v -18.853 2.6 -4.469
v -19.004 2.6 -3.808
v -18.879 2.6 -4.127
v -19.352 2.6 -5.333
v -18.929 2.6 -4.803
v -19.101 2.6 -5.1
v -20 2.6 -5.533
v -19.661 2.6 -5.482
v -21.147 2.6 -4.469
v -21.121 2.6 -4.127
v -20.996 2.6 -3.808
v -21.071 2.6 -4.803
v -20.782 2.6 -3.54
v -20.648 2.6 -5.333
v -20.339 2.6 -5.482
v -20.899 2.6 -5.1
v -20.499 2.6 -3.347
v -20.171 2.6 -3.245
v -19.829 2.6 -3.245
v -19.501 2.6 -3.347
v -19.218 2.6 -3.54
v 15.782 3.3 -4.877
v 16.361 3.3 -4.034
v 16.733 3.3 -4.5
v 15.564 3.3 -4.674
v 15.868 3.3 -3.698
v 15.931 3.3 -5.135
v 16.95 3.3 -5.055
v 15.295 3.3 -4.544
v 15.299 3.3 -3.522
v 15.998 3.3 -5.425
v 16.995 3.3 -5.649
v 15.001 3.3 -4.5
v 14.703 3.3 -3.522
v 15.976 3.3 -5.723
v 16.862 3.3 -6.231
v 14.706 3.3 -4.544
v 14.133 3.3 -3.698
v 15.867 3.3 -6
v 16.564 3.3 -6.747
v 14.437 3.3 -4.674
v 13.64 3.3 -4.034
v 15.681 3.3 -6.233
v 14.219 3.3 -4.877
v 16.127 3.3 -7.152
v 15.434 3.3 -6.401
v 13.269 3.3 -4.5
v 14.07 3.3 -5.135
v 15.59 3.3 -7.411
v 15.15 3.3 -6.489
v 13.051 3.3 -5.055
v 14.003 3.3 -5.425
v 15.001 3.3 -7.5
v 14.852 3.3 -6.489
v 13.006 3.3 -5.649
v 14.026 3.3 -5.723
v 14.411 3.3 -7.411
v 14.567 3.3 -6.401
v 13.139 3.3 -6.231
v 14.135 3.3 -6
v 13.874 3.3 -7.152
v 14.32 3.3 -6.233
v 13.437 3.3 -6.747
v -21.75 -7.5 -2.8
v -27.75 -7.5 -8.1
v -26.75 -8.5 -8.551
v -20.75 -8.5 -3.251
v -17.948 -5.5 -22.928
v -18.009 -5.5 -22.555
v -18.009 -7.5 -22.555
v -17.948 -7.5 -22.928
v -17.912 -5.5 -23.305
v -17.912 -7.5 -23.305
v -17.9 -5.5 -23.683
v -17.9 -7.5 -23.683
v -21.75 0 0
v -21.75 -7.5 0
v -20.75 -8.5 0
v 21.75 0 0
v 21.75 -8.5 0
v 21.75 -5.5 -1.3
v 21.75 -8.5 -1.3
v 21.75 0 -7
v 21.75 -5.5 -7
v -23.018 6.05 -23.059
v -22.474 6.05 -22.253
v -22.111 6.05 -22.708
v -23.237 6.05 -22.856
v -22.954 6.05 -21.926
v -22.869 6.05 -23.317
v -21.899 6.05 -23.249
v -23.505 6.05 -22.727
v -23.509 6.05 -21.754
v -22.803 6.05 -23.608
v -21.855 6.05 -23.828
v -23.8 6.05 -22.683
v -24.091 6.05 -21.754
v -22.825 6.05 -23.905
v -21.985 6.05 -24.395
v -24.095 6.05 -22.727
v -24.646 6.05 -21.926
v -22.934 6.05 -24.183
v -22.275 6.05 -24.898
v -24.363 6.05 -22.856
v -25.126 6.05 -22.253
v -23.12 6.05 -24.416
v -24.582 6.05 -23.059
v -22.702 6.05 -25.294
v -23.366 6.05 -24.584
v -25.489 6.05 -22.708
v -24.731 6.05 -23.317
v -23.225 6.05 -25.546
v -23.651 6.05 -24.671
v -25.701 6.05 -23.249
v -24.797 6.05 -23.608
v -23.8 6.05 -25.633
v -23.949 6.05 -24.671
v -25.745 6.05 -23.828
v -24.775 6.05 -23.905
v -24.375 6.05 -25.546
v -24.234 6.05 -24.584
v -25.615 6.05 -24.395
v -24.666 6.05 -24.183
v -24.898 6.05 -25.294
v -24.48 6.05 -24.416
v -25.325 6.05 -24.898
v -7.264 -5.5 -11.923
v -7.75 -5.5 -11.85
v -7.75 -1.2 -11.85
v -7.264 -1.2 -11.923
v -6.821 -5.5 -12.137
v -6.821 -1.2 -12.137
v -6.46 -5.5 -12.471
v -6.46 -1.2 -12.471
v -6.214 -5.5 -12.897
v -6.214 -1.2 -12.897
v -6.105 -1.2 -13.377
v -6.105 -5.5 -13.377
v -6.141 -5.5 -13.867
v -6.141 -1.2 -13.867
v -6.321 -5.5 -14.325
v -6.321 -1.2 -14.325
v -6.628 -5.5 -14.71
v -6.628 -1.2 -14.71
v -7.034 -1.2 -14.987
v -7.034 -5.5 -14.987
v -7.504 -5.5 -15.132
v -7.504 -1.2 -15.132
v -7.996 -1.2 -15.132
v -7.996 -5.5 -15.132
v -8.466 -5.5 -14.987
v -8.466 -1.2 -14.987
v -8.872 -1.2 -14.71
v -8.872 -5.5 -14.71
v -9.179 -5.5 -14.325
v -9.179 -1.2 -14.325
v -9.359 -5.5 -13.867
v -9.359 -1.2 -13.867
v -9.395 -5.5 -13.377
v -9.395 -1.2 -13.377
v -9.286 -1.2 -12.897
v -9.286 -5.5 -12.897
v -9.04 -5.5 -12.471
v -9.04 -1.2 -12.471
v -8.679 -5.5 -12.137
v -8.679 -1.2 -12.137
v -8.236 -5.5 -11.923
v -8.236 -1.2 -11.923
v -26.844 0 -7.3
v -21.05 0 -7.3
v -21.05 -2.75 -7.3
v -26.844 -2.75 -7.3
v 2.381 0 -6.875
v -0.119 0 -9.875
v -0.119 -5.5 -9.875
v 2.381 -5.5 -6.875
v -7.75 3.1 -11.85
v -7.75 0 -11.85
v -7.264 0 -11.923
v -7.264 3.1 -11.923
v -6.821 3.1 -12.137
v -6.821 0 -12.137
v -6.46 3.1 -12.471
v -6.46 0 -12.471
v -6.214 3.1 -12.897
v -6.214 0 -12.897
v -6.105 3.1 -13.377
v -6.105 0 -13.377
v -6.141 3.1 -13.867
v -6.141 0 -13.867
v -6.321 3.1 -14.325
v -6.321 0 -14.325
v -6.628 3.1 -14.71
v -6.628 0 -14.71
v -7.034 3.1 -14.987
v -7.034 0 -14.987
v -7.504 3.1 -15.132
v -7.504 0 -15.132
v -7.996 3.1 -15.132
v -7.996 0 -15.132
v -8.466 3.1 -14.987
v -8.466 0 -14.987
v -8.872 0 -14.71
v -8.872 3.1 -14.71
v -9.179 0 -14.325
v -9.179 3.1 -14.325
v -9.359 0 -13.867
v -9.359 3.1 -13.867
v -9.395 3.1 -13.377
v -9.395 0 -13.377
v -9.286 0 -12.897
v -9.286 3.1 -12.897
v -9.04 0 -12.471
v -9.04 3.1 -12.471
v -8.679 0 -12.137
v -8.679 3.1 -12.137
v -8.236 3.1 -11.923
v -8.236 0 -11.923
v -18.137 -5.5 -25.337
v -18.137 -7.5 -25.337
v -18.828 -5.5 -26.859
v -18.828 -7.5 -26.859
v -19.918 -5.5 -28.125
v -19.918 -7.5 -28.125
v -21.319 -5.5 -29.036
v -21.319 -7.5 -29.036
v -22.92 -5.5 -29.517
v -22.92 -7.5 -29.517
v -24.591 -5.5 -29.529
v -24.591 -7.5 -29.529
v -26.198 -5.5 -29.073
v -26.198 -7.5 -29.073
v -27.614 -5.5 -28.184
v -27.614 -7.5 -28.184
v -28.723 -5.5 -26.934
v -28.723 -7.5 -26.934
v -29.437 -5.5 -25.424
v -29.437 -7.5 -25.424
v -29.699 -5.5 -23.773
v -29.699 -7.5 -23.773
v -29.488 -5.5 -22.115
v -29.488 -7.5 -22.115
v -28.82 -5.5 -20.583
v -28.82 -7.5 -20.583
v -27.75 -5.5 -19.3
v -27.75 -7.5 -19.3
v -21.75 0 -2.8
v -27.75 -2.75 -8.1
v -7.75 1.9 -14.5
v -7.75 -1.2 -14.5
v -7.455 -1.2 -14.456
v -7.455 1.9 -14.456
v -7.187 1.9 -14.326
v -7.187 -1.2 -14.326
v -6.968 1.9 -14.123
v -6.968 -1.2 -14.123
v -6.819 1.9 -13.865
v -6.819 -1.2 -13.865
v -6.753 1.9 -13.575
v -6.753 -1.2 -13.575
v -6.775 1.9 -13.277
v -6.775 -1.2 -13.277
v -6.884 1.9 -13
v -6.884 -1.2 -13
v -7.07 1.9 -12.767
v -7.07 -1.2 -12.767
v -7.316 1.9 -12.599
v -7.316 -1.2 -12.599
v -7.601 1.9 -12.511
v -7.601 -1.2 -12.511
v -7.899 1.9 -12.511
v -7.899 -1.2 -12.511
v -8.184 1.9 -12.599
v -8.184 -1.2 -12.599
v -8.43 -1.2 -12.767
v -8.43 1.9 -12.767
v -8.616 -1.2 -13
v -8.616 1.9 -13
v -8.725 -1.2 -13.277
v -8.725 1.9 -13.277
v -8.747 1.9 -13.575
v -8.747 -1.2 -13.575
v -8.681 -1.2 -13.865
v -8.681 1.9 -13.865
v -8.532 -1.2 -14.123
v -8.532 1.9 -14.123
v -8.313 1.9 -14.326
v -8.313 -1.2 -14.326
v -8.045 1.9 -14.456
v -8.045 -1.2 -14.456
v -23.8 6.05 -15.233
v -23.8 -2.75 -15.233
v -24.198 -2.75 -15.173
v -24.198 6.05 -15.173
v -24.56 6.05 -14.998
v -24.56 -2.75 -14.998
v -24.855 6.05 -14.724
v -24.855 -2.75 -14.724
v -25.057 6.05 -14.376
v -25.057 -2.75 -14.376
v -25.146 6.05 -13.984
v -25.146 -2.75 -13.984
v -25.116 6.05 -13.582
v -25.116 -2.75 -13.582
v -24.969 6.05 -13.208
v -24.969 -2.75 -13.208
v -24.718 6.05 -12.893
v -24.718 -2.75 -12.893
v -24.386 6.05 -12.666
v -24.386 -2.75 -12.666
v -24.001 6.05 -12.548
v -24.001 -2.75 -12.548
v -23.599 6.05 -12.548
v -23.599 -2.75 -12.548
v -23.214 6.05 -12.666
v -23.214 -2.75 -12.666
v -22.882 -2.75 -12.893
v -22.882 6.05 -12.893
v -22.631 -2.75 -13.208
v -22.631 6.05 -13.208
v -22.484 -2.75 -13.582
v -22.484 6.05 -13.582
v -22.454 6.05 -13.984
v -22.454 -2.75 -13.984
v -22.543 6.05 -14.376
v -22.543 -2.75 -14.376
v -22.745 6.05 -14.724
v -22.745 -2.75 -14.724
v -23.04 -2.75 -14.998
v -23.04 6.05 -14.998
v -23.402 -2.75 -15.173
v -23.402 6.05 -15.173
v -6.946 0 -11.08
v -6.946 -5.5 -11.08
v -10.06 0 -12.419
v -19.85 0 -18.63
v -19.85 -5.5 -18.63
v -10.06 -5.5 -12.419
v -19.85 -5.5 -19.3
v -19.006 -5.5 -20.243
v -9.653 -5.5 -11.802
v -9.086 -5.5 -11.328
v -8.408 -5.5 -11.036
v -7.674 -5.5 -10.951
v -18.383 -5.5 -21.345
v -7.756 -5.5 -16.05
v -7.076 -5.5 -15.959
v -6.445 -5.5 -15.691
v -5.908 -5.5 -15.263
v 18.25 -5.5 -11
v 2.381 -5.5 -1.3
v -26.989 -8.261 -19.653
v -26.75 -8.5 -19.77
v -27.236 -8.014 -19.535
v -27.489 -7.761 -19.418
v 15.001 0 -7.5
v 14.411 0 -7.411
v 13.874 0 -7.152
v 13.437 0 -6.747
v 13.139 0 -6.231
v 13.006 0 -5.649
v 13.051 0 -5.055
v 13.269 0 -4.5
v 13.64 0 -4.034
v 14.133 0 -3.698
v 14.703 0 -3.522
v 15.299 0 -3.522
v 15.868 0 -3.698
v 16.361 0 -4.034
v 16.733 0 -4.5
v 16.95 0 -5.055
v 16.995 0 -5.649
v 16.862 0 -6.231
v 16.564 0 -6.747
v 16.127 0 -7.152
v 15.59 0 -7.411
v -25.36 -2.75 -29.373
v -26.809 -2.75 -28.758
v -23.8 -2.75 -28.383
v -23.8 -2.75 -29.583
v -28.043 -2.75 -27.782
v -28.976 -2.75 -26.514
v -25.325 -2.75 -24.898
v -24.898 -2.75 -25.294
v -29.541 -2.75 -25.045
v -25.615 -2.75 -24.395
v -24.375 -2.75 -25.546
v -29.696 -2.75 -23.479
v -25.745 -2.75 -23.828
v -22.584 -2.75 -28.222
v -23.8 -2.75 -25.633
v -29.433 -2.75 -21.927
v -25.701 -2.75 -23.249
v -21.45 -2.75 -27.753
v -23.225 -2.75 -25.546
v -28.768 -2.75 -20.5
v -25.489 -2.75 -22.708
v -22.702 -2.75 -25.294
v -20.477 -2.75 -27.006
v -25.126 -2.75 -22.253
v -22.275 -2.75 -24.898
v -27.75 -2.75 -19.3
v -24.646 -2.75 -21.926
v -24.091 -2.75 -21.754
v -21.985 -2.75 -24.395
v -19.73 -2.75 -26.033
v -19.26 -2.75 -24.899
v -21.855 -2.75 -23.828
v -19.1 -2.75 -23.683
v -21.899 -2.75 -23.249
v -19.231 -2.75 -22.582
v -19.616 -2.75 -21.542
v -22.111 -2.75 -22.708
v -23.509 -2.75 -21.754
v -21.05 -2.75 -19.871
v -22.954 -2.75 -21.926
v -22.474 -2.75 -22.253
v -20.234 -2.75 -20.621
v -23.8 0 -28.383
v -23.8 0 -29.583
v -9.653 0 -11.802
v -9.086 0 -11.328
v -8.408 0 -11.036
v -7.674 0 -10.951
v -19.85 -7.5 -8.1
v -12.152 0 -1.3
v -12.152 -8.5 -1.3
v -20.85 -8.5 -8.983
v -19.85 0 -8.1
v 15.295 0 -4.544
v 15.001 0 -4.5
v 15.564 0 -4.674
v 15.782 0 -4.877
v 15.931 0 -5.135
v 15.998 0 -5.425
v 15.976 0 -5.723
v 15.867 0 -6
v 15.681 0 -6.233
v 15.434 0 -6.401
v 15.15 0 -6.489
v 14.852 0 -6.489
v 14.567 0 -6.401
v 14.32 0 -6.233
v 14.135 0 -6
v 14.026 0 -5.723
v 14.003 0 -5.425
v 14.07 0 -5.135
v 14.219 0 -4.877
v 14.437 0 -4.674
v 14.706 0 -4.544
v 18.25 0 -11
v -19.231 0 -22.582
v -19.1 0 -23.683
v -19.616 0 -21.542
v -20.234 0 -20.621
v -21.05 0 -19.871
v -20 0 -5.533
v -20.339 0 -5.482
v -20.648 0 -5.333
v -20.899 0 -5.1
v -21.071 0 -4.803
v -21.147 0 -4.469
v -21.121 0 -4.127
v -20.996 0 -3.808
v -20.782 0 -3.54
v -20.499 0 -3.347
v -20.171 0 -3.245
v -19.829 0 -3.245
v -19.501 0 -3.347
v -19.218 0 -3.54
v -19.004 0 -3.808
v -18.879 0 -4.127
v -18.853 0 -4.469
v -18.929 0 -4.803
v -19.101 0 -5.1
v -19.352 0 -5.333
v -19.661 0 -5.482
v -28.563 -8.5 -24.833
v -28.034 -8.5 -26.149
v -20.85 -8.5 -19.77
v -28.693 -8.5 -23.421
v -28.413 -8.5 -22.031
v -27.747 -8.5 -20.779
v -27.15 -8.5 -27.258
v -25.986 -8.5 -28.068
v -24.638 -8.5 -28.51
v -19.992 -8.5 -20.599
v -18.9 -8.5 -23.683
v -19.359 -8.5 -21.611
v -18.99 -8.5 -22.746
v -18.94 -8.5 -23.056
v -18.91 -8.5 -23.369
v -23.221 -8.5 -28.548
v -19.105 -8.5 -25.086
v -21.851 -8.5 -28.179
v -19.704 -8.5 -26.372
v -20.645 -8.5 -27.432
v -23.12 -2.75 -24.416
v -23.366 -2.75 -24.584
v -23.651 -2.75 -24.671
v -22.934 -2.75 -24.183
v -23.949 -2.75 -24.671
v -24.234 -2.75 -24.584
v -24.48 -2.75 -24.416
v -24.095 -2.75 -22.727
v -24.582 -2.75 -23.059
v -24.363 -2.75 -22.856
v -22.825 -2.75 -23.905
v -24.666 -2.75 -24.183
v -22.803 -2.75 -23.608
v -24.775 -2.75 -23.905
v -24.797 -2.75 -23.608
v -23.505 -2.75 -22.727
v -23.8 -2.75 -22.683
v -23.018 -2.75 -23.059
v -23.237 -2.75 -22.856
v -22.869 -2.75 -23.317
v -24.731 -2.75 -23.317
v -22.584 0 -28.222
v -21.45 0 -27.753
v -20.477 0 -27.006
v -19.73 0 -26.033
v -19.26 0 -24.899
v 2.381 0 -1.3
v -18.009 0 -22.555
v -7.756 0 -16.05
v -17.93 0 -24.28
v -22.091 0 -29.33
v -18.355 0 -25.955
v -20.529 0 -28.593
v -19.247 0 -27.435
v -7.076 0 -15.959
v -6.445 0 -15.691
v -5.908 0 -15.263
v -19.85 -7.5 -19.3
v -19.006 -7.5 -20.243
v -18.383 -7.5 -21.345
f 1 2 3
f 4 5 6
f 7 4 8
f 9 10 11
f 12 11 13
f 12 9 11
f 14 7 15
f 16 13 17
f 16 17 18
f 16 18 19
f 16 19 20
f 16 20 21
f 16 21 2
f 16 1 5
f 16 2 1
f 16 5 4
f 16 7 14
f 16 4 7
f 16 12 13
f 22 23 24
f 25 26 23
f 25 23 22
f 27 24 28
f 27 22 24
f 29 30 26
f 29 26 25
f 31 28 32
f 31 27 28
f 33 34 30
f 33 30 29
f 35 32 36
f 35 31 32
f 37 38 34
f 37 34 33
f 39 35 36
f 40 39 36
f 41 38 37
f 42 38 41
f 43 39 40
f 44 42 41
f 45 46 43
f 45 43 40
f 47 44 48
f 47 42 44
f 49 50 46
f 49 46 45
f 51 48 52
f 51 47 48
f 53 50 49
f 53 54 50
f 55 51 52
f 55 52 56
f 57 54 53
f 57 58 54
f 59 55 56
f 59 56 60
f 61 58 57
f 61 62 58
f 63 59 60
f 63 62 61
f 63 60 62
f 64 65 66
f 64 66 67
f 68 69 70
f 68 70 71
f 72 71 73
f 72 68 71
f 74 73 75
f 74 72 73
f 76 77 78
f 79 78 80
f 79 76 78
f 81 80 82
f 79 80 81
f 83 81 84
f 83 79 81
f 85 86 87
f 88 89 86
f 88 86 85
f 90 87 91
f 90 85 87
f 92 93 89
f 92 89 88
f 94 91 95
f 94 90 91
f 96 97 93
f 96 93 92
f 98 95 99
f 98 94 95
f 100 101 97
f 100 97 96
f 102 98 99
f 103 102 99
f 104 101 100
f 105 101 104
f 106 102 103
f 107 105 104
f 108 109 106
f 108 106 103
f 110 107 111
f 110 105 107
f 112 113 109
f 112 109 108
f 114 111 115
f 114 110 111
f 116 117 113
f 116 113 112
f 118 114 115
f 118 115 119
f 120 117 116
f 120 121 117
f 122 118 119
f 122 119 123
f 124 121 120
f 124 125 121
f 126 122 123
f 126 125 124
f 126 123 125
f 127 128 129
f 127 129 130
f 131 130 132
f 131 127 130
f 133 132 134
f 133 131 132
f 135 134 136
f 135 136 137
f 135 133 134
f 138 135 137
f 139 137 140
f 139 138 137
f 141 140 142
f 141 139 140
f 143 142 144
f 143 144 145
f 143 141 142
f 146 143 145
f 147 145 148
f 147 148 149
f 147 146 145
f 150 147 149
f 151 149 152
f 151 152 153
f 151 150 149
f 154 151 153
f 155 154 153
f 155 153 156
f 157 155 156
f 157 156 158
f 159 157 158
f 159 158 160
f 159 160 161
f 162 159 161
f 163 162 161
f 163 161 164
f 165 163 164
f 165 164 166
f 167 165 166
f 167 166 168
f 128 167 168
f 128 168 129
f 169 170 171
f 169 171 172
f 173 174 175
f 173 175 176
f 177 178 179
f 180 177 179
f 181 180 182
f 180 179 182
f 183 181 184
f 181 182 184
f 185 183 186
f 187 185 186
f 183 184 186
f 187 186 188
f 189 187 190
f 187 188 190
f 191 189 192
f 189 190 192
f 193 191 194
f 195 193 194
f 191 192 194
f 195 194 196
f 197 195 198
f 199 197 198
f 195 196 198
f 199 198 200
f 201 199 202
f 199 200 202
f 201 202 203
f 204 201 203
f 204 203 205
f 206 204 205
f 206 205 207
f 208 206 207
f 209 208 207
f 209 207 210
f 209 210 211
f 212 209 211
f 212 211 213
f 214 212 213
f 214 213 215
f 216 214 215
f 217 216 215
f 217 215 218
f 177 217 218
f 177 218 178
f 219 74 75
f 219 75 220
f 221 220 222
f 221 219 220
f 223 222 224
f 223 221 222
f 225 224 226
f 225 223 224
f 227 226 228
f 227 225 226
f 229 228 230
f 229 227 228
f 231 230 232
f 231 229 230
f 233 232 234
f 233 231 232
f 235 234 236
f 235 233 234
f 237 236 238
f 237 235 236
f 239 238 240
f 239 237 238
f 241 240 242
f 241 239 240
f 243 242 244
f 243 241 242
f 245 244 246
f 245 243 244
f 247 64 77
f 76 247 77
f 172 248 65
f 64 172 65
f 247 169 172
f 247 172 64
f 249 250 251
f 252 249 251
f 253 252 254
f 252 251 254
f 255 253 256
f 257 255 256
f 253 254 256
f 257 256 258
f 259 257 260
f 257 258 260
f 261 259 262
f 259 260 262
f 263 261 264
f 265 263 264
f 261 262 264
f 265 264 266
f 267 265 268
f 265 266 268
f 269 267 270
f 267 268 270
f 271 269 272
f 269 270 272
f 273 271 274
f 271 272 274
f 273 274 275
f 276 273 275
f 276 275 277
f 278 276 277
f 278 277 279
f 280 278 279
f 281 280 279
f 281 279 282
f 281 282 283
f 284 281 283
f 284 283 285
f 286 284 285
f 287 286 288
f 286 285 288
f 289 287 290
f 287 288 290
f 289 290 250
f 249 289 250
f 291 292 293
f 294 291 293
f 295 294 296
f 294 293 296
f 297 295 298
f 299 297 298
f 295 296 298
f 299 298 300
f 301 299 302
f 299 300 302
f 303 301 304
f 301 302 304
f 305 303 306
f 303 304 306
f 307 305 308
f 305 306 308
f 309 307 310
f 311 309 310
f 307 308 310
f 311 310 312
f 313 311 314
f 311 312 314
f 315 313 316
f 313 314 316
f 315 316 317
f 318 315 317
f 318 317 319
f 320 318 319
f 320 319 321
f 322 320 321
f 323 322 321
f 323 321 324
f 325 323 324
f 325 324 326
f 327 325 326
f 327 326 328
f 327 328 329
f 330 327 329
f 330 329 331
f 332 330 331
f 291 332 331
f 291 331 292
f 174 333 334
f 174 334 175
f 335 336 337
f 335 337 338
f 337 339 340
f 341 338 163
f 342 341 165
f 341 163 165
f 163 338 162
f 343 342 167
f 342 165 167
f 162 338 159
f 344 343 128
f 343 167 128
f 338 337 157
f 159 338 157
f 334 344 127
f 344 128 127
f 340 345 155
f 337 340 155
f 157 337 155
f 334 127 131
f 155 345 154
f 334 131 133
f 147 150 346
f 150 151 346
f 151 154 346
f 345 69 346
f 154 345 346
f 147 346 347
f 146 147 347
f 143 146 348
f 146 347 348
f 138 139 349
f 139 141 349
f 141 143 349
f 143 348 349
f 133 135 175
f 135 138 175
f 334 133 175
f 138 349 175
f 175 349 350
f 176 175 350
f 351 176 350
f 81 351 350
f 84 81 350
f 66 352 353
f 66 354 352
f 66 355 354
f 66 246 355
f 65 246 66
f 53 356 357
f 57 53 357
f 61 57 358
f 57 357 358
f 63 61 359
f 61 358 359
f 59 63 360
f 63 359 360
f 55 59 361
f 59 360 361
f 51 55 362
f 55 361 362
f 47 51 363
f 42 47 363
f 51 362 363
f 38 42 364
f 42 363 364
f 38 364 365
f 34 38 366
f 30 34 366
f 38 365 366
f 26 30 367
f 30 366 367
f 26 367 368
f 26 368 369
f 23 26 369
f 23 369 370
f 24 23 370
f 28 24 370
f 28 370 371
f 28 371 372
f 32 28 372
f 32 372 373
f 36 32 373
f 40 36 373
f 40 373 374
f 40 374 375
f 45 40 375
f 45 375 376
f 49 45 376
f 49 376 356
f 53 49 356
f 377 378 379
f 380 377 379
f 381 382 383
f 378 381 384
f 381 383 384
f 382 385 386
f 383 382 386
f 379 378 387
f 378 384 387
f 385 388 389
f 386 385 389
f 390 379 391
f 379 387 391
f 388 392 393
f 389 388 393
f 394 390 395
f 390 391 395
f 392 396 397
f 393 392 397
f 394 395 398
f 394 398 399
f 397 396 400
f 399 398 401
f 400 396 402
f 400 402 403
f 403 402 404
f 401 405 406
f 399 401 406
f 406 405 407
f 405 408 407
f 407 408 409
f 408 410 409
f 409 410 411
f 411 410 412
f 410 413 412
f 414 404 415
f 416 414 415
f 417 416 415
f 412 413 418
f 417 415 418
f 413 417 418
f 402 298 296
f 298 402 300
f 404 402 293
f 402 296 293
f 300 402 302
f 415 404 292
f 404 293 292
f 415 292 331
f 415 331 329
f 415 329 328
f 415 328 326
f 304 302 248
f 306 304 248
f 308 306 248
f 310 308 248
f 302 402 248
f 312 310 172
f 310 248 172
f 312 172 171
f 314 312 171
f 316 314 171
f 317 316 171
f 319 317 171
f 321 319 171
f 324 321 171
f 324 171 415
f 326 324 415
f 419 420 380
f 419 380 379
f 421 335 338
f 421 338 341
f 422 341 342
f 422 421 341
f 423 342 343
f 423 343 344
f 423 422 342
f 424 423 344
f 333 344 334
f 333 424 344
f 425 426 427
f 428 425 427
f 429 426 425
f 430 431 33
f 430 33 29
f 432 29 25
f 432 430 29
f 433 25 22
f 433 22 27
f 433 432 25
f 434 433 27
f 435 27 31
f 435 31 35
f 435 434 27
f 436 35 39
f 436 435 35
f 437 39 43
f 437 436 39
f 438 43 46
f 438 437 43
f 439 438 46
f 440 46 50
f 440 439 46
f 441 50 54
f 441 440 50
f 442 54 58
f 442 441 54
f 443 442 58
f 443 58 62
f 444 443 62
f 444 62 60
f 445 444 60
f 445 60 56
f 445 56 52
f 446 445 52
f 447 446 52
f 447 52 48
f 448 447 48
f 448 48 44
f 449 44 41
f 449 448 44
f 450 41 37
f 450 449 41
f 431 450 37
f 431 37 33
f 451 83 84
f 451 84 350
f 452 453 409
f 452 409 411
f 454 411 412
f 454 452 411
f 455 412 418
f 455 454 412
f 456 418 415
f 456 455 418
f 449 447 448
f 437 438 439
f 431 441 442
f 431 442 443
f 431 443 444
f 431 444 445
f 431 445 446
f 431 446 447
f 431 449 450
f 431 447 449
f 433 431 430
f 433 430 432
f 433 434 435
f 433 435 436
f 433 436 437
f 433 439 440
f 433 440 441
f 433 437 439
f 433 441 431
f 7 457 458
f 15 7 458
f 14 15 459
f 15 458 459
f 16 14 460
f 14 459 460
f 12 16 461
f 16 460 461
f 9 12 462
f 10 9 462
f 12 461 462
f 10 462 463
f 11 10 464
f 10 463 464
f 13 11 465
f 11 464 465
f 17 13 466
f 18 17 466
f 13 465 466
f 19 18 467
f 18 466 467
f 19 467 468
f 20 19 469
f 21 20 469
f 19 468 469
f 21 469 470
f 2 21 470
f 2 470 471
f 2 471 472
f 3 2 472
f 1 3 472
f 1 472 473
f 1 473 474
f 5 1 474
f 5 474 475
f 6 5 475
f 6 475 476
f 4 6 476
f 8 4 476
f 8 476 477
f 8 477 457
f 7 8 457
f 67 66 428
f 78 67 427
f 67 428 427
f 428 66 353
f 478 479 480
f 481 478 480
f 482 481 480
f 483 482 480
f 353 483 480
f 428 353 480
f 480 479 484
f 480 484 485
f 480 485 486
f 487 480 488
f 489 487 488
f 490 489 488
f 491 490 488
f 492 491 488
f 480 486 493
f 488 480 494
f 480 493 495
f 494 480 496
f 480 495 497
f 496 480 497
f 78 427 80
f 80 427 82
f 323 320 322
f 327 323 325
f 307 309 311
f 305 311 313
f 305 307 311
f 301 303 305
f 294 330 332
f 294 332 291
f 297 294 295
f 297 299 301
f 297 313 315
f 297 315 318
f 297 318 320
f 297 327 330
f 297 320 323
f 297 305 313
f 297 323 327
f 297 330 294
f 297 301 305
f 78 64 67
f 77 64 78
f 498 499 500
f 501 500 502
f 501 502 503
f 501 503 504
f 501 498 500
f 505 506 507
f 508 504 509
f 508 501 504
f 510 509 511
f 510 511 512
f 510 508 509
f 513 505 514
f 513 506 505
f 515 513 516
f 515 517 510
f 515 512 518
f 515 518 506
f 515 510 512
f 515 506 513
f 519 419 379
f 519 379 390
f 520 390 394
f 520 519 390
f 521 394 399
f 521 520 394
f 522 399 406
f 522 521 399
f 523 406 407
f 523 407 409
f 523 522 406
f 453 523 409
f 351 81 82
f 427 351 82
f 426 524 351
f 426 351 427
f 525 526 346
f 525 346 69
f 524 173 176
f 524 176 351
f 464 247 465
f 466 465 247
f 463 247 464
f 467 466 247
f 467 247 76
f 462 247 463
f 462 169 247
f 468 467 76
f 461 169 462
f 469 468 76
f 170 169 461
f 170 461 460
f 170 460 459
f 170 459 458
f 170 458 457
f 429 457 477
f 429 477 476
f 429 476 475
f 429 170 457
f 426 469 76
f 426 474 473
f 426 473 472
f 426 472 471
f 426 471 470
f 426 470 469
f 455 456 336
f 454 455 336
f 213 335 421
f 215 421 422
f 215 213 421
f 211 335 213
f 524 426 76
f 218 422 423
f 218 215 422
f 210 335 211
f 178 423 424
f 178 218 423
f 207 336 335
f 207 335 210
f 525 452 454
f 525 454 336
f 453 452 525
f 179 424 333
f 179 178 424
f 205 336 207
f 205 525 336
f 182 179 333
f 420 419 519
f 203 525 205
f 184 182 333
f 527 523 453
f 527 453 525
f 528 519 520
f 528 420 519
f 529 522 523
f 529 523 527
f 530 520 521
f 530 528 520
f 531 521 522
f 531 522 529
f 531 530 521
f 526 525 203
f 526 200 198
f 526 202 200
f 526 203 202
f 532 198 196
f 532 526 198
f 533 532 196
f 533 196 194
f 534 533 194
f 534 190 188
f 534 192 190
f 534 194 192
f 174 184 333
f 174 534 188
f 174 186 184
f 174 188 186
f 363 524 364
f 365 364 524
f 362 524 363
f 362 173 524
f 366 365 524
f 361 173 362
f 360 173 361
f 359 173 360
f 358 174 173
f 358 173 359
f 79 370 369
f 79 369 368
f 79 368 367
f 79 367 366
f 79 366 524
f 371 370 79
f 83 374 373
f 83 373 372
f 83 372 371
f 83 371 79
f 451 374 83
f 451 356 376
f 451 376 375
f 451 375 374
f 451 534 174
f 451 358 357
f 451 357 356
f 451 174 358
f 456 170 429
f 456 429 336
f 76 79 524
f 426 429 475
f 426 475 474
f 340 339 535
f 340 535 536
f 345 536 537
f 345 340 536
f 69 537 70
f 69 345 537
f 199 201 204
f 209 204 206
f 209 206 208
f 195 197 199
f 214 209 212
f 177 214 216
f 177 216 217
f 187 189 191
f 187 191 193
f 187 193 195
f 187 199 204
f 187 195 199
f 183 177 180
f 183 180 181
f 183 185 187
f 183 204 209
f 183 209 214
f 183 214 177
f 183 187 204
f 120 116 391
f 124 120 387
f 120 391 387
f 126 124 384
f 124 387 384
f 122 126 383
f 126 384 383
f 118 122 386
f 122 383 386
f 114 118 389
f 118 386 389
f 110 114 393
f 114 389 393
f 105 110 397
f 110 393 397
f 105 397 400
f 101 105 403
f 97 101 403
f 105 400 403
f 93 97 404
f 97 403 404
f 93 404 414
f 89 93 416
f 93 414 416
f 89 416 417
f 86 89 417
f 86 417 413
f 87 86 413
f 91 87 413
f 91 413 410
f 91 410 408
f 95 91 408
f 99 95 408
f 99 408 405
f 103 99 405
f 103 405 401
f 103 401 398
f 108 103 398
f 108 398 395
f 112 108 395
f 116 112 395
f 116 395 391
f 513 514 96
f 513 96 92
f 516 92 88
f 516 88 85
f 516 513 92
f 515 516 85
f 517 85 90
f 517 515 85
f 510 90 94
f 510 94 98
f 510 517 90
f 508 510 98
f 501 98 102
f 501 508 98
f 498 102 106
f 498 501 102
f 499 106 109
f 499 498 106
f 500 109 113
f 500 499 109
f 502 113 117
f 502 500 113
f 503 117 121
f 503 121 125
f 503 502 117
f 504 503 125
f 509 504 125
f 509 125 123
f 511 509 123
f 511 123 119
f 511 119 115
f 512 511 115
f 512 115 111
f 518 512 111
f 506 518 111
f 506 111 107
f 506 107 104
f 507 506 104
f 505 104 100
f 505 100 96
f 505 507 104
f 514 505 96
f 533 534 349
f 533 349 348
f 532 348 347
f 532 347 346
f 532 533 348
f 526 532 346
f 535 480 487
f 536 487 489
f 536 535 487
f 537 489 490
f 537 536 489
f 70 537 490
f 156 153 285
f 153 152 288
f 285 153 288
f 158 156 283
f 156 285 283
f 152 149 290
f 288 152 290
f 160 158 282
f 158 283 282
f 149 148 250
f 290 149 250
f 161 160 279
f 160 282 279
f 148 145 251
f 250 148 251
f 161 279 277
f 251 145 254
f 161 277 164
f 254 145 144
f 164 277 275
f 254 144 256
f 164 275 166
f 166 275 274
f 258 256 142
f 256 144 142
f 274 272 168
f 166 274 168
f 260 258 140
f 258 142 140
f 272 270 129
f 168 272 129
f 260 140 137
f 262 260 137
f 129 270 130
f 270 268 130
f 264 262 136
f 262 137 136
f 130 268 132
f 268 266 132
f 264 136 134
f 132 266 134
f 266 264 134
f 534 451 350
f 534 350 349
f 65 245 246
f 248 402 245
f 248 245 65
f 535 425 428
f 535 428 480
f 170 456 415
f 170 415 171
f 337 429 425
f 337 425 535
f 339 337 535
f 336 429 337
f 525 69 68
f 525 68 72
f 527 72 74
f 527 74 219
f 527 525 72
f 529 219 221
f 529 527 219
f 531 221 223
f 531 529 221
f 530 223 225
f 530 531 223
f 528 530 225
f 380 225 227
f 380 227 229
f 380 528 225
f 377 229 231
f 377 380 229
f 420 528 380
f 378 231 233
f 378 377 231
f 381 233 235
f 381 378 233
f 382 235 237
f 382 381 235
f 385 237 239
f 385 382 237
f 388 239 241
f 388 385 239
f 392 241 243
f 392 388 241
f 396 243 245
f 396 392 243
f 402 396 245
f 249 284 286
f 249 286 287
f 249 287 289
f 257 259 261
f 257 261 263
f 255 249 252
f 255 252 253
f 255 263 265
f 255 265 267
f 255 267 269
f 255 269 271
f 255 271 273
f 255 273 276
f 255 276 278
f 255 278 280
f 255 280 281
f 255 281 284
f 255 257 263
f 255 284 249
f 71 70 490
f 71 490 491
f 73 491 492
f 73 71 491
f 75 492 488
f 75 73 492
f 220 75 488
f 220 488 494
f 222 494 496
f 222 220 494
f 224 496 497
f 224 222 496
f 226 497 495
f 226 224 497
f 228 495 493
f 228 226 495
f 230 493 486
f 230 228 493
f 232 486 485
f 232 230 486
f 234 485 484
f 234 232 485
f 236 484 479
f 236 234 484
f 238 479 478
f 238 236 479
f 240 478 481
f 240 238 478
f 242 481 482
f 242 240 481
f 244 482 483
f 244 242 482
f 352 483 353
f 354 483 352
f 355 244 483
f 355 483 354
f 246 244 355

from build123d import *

# Parameters (mm, degrees)
BOSS_EXTRUDE1_DEPTH      = 5.5
SKETCH2_R                = 1.65
CUT_EXTRUDE1_DEPTH       = 5.5
BOSS_EXTRUDE2_DEPTH      = 3
CUT_EXTRUDE2_DEPTH       = 2.75
SKETCH5_R                = 1.95
SKETCH5_R_2              = 1.35
SKETCH5_R_3              = 1.15
SKETCH5_R_4              = 2
CUT_EXTRUDE3_DEPTH       = 4.3
SKETCH7_R                = 1.95
SKETCH7_R_2              = 1.35
CUT_EXTRUDE4_DEPTH       = 3
CHAMFER1_SIZE            = 1
CUT_EXTRUDE5_DEPTH       = 2.75
SKETCH9_R                = 1.95
BOSS_EXTRUDE3_DEPTH      = 13.35
CUT_EXTRUDE6_START       = -8.8
SKETCH10_R               = 1
CUT_EXTRUDE6_DEPTH       = 8.8
SKETCH11_R               = 1.35
BOSS_EXTRUDE4_DEPTH      = 13.35
SKETCH12_R               = 1.15
BOSS_EXTRUDE5_DEPTH      = 6.9
SKETCH13_R               = 2
BOSS_EXTRUDE6_DEPTH      = 7.6
CUT_EXTRUDE7_START       = -3.3
SKETCH14_R               = 1
CUT_EXTRUDE7_DEPTH       = 3.3
BOSS_EXTRUDE7_DEPTH      = 3.1
BOSS_EXTRUDE7_DEPTH_BACK = 1.2
SKETCH15_R               = 1.65
SKETCH16_R               = 1
CUT_EXTRUDE8_DEPTH       = 3.1


with BuildPart() as part:
    # Sketch1 → Boss-Extrude1 (new body)
    with BuildSketch(Plane(origin=(0, 0, 0), x_dir=(1, 0, 0), z_dir=(0, 1, 0))):
        with BuildLine():
            Line((-7.755996733, 16.049992949), (-18.008818061, 22.554712546))
            ThreePointArc((-18.008818061, 22.554712546), (-25.669699487, 29.278547542), (-27.75, 19.3))
            Line((-27.75, 19.3), (-27.75, 8.1))
            Line((-27.75, 8.1), (-21.75, 2.8))
            Line((-21.75, 2.8), (-21.75, 0))
            Line((-21.75, 0), (21.75, 0))
            Line((21.75, 0), (21.75, 7))
            Line((21.75, 7), (18.25, 11))
            Line((18.25, 11), (-5.907756778, 15.263133549))
            ThreePointArc((-5.907756778, 15.263133549), (-6.75113203, 15.846223088), (-7.755996733, 16.049992949))
        make_face()
        with BuildLine():
            Line((-19.85, 18.630440726), (-10.05956754, 12.419075498))
            ThreePointArc((-10.05956754, 12.419075498), (-8.75757921, 11.15750472), (-6.94630287, 11.079964685))
            Line((-6.94630287, 11.079964685), (-0.119008465, 9.875148026))
            Line((-0.119008465, 9.875148026), (2.380991535, 6.875148026))
            Line((2.380991535, 6.875148026), (2.380991535, 1.3))
            Line((2.380991535, 1.3), (-12.151886792, 1.3))
            Line((-12.151886792, 1.3), (-19.85, 8.1))
            Line((-19.85, 8.1), (-19.85, 18.630440726))
        make_face(mode=Mode.SUBTRACT)
    extrude(amount=BOSS_EXTRUDE1_DEPTH)

    # Sketch2 → Cut-Extrude1 (cut)
    with BuildSketch(Plane(origin=(0, 5.5, 0), x_dir=(1, 0, 0), z_dir=(0, 1, 0))):
        with Locations(Location((-7.75, 13.5, 0), (0, 0, 270))):
            Circle(SKETCH2_R)
    extrude(amount=-CUT_EXTRUDE1_DEPTH, mode=Mode.SUBTRACT)

    # Sketch3 → Boss-Extrude2 (add)
    with BuildSketch(Plane(origin=(0, 5.5, 0), x_dir=(1, 0, 0), z_dir=(0, 1, 0))):
        with BuildLine():
            ThreePointArc((-27.75, 19.3), (-23.8, 17.782636193), (-19.85, 19.3))
            ThreePointArc((-19.85, 19.3), (-18.664735174, 20.777631), (-18.008818061, 22.554712546))
            ThreePointArc((-18.008818061, 22.554712546), (-17.927267525, 23.116055854), (-17.9, 23.682636193))
            ThreePointArc((-17.9, 23.682636193), (-26.198436991, 29.073137097), (-27.75, 19.3))
        make_face()
        with BuildLine():
            Line((-12.151886792, 1.3), (-19.85, 8.1))
            Line((-19.85, 8.1), (-19.85, 18.630440726))
            Line((-19.85, 18.630440726), (-19.85, 19.3))
            ThreePointArc((-19.85, 19.3), (-23.8, 17.782636193), (-27.75, 19.3))
            Line((-27.75, 19.3), (-27.75, 8.1))
            Line((-27.75, 8.1), (-21.75, 2.8))
            Line((-21.75, 2.8), (-21.75, 0))
            Line((-21.75, 0), (21.75, 0))
            Line((21.75, 0), (21.75, 1.3))
            Line((21.75, 1.3), (2.380991535, 1.3))
            Line((2.380991535, 1.3), (-12.151886792, 1.3))
        make_face()
    extrude(amount=BOSS_EXTRUDE2_DEPTH)

    # Sketch4 → Cut-Extrude2 (cut)
    with BuildSketch(Plane.XZ):
        with BuildLine():
            ThreePointArc((-27.75, -19.3), (-29.307610804, -25.798344876), (-23.8, -29.582636193))
            Line((-23.8, -29.582636193), (-23.8, -7.3))
            Line((-23.8, -7.3), (-26.844339623, -7.3))
            Line((-26.844339623, -7.3), (-27.75, -8.1))
            Line((-27.75, -8.1), (-27.75, -19.3))
        make_face()
    extrude(amount=-CUT_EXTRUDE2_DEPTH, mode=Mode.SUBTRACT)

    # Sketch5 → Cut-Extrude3 (cut)
    with BuildSketch(Plane.XZ):
        with Locations(Location((-23.8, -23.682636193, 0), (0, 0, 90))):
            Circle(SKETCH5_R)
        with Locations(Location((-23.8, -13.882636193, 0), (0, 0, 90))):
            Circle(SKETCH5_R_2)
        with Locations(Location((-20, -4.382636193, 0), (0, 0, 270))):
            Circle(SKETCH5_R_3)
        with Locations(Location((15.000589162, -5.5, 0), (0, 0, 270))):
            Circle(SKETCH5_R_4)
    extrude(amount=-CUT_EXTRUDE3_DEPTH, mode=Mode.SUBTRACT)

    # Sketch7 → Cut-Extrude4 (cut)
    with BuildSketch(Plane.XZ.offset(-4.3)):
        with Locations(Location((-23.8, -23.682636193, 0), (0, 0, 90))):
            Circle(SKETCH7_R)
        with Locations(Location((-23.8, -13.882636193, 0), (0, 0, 90))):
            Circle(SKETCH7_R_2)
    extrude(amount=-CUT_EXTRUDE4_DEPTH, mode=Mode.SUBTRACT)

    # Chamfer1
    chamfer1_edges = [part.edges().sort_by_distance(p)[0] for p in [
        (-23.8, 8.5, -29.582636193),
        (-27.75, 8.5, -13.7),
        (-24.75, 8.5, -5.45),
        (-21.75, 8.5, -1.4),
        (-19.85, 8.5, -13.7),
    ]]
    chamfer(chamfer1_edges, length=CHAMFER1_SIZE)

    # Sketch8 → Cut-Extrude5 (cut)
    with BuildSketch(Plane.XZ):
        with BuildLine():
            Line((-21.05, -7.3), (-23.8, -7.3))
            Line((-23.8, -7.3), (-23.8, -12.532636193))
            ThreePointArc((-23.8, -12.532636193), (-22.45, -13.882636193), (-23.8, -15.232636193))
            Line((-23.8, -15.232636193), (-23.8, -18.982636193))
            ThreePointArc((-23.8, -18.982636193), (-22.355013861, -19.210274953), (-21.05, -19.871140424))
            Line((-21.05, -19.871140424), (-21.05, -7.3))
        make_face()
        with BuildLine():
            ThreePointArc((-19.1, -23.682636193), (-19.615803542, -21.54195873), (-21.05, -19.871140424))
            ThreePointArc((-21.05, -19.871140424), (-22.355013861, -19.210274953), (-23.8, -18.982636193))
            Line((-23.8, -18.982636193), (-23.8, -21.732636193))
            ThreePointArc((-23.8, -21.732636193), (-21.85, -23.682636193), (-23.8, -25.632636193))
            Line((-23.8, -25.632636193), (-23.8, -28.382636193))
            ThreePointArc((-23.8, -28.382636193), (-20.476598128, -27.006038065), (-19.1, -23.682636193))
        make_face()
        with BuildLine():
            Line((-23.8, -21.732636193), (-23.8, -18.982636193))
            ThreePointArc((-23.8, -18.982636193), (-28.5, -23.682636193), (-23.8, -28.382636193))
            Line((-23.8, -28.382636193), (-23.8, -25.632636193))
            ThreePointArc((-23.8, -25.632636193), (-21.85, -23.682636193), (-23.8, -21.732636193))
        make_face()
    extrude(amount=-CUT_EXTRUDE5_DEPTH, mode=Mode.SUBTRACT)


with BuildPart() as body_2:
    # Mirror1: mirrored copy
    add(part.part.mirror(Plane.ZX))

    # Sketch9 → Boss-Extrude3 (add)
    with BuildSketch(Plane(origin=(0, -7.3, 0), x_dir=(1, 0, 0), z_dir=(0, 1, 0))):
        with Locations(Location((-23.8, 23.682636193, 0), (0, 0, 90))):
            Circle(SKETCH9_R)
    extrude(amount=BOSS_EXTRUDE3_DEPTH)

    # Sketch10 → Cut-Extrude6 (cut)
    with BuildSketch(Plane(origin=(0, 6.05, 0), x_dir=(1, 0, 0), z_dir=(0, 1, 0)).offset(CUT_EXTRUDE6_START)):
        with Locations(Location((-23.8, 23.682636193, 0), (0, 0, 270))):
            Circle(SKETCH10_R)
    extrude(amount=CUT_EXTRUDE6_DEPTH, mode=Mode.SUBTRACT)

    # Sketch11 → Boss-Extrude4 (add)
    with BuildSketch(Plane(origin=(0, -7.3, 0), x_dir=(1, 0, 0), z_dir=(0, 1, 0))):
        with Locations(Location((-23.8, 13.882636193, 0), (0, 0, 90))):
            Circle(SKETCH11_R)
    extrude(amount=BOSS_EXTRUDE4_DEPTH)

    # Sketch12 → Boss-Extrude5 (add)
    with BuildSketch(Plane(origin=(0, -4.3, 0), x_dir=(1, 0, 0), z_dir=(0, 1, 0))):
        with Locations(Location((-20, 4.382636193, 0), (0, 0, 90))):
            Circle(SKETCH12_R)
    extrude(amount=BOSS_EXTRUDE5_DEPTH)

    # Sketch13 → Boss-Extrude6 (add)
    with BuildSketch(Plane(origin=(0, -4.3, 0), x_dir=(1, 0, 0), z_dir=(0, 1, 0))):
        with Locations(Location((15.000589162, 5.5, 0), (0, 0, 90))):
            Circle(SKETCH13_R)
    extrude(amount=BOSS_EXTRUDE6_DEPTH)

    # Sketch14 → Cut-Extrude7 (cut)
    with BuildSketch(Plane(origin=(0, 3.3, 0), x_dir=(1, 0, 0), z_dir=(0, 1, 0)).offset(CUT_EXTRUDE7_START)):
        with Locations(Location((15.000589162, 5.5, 0), (0, 0, 270))):
            Circle(SKETCH14_R)
    extrude(amount=CUT_EXTRUDE7_DEPTH, mode=Mode.SUBTRACT)

    # Sketch15 → Boss-Extrude7 (add, two sides: drawn at the far end of the back side and taken through both)
    with BuildSketch(Plane(origin=(0, 0, 0), x_dir=(1, 0, 0), z_dir=(0, 1, 0)).offset(-BOSS_EXTRUDE7_DEPTH_BACK)):
        with Locations(Location((-7.75, 13.5, 0), (0, 0, 270))):
            Circle(SKETCH15_R)
    extrude(amount=BOSS_EXTRUDE7_DEPTH + BOSS_EXTRUDE7_DEPTH_BACK)

    # Sketch16 → Cut-Extrude8 (cut)
    with BuildSketch(Plane.XZ.offset(1.2)):
        with Locations(Location((-7.75, -13.5, 0), (0, 0, 270))):
            Circle(SKETCH16_R)
    extrude(amount=-CUT_EXTRUDE8_DEPTH, mode=Mode.SUBTRACT)


solid = body_2.part
